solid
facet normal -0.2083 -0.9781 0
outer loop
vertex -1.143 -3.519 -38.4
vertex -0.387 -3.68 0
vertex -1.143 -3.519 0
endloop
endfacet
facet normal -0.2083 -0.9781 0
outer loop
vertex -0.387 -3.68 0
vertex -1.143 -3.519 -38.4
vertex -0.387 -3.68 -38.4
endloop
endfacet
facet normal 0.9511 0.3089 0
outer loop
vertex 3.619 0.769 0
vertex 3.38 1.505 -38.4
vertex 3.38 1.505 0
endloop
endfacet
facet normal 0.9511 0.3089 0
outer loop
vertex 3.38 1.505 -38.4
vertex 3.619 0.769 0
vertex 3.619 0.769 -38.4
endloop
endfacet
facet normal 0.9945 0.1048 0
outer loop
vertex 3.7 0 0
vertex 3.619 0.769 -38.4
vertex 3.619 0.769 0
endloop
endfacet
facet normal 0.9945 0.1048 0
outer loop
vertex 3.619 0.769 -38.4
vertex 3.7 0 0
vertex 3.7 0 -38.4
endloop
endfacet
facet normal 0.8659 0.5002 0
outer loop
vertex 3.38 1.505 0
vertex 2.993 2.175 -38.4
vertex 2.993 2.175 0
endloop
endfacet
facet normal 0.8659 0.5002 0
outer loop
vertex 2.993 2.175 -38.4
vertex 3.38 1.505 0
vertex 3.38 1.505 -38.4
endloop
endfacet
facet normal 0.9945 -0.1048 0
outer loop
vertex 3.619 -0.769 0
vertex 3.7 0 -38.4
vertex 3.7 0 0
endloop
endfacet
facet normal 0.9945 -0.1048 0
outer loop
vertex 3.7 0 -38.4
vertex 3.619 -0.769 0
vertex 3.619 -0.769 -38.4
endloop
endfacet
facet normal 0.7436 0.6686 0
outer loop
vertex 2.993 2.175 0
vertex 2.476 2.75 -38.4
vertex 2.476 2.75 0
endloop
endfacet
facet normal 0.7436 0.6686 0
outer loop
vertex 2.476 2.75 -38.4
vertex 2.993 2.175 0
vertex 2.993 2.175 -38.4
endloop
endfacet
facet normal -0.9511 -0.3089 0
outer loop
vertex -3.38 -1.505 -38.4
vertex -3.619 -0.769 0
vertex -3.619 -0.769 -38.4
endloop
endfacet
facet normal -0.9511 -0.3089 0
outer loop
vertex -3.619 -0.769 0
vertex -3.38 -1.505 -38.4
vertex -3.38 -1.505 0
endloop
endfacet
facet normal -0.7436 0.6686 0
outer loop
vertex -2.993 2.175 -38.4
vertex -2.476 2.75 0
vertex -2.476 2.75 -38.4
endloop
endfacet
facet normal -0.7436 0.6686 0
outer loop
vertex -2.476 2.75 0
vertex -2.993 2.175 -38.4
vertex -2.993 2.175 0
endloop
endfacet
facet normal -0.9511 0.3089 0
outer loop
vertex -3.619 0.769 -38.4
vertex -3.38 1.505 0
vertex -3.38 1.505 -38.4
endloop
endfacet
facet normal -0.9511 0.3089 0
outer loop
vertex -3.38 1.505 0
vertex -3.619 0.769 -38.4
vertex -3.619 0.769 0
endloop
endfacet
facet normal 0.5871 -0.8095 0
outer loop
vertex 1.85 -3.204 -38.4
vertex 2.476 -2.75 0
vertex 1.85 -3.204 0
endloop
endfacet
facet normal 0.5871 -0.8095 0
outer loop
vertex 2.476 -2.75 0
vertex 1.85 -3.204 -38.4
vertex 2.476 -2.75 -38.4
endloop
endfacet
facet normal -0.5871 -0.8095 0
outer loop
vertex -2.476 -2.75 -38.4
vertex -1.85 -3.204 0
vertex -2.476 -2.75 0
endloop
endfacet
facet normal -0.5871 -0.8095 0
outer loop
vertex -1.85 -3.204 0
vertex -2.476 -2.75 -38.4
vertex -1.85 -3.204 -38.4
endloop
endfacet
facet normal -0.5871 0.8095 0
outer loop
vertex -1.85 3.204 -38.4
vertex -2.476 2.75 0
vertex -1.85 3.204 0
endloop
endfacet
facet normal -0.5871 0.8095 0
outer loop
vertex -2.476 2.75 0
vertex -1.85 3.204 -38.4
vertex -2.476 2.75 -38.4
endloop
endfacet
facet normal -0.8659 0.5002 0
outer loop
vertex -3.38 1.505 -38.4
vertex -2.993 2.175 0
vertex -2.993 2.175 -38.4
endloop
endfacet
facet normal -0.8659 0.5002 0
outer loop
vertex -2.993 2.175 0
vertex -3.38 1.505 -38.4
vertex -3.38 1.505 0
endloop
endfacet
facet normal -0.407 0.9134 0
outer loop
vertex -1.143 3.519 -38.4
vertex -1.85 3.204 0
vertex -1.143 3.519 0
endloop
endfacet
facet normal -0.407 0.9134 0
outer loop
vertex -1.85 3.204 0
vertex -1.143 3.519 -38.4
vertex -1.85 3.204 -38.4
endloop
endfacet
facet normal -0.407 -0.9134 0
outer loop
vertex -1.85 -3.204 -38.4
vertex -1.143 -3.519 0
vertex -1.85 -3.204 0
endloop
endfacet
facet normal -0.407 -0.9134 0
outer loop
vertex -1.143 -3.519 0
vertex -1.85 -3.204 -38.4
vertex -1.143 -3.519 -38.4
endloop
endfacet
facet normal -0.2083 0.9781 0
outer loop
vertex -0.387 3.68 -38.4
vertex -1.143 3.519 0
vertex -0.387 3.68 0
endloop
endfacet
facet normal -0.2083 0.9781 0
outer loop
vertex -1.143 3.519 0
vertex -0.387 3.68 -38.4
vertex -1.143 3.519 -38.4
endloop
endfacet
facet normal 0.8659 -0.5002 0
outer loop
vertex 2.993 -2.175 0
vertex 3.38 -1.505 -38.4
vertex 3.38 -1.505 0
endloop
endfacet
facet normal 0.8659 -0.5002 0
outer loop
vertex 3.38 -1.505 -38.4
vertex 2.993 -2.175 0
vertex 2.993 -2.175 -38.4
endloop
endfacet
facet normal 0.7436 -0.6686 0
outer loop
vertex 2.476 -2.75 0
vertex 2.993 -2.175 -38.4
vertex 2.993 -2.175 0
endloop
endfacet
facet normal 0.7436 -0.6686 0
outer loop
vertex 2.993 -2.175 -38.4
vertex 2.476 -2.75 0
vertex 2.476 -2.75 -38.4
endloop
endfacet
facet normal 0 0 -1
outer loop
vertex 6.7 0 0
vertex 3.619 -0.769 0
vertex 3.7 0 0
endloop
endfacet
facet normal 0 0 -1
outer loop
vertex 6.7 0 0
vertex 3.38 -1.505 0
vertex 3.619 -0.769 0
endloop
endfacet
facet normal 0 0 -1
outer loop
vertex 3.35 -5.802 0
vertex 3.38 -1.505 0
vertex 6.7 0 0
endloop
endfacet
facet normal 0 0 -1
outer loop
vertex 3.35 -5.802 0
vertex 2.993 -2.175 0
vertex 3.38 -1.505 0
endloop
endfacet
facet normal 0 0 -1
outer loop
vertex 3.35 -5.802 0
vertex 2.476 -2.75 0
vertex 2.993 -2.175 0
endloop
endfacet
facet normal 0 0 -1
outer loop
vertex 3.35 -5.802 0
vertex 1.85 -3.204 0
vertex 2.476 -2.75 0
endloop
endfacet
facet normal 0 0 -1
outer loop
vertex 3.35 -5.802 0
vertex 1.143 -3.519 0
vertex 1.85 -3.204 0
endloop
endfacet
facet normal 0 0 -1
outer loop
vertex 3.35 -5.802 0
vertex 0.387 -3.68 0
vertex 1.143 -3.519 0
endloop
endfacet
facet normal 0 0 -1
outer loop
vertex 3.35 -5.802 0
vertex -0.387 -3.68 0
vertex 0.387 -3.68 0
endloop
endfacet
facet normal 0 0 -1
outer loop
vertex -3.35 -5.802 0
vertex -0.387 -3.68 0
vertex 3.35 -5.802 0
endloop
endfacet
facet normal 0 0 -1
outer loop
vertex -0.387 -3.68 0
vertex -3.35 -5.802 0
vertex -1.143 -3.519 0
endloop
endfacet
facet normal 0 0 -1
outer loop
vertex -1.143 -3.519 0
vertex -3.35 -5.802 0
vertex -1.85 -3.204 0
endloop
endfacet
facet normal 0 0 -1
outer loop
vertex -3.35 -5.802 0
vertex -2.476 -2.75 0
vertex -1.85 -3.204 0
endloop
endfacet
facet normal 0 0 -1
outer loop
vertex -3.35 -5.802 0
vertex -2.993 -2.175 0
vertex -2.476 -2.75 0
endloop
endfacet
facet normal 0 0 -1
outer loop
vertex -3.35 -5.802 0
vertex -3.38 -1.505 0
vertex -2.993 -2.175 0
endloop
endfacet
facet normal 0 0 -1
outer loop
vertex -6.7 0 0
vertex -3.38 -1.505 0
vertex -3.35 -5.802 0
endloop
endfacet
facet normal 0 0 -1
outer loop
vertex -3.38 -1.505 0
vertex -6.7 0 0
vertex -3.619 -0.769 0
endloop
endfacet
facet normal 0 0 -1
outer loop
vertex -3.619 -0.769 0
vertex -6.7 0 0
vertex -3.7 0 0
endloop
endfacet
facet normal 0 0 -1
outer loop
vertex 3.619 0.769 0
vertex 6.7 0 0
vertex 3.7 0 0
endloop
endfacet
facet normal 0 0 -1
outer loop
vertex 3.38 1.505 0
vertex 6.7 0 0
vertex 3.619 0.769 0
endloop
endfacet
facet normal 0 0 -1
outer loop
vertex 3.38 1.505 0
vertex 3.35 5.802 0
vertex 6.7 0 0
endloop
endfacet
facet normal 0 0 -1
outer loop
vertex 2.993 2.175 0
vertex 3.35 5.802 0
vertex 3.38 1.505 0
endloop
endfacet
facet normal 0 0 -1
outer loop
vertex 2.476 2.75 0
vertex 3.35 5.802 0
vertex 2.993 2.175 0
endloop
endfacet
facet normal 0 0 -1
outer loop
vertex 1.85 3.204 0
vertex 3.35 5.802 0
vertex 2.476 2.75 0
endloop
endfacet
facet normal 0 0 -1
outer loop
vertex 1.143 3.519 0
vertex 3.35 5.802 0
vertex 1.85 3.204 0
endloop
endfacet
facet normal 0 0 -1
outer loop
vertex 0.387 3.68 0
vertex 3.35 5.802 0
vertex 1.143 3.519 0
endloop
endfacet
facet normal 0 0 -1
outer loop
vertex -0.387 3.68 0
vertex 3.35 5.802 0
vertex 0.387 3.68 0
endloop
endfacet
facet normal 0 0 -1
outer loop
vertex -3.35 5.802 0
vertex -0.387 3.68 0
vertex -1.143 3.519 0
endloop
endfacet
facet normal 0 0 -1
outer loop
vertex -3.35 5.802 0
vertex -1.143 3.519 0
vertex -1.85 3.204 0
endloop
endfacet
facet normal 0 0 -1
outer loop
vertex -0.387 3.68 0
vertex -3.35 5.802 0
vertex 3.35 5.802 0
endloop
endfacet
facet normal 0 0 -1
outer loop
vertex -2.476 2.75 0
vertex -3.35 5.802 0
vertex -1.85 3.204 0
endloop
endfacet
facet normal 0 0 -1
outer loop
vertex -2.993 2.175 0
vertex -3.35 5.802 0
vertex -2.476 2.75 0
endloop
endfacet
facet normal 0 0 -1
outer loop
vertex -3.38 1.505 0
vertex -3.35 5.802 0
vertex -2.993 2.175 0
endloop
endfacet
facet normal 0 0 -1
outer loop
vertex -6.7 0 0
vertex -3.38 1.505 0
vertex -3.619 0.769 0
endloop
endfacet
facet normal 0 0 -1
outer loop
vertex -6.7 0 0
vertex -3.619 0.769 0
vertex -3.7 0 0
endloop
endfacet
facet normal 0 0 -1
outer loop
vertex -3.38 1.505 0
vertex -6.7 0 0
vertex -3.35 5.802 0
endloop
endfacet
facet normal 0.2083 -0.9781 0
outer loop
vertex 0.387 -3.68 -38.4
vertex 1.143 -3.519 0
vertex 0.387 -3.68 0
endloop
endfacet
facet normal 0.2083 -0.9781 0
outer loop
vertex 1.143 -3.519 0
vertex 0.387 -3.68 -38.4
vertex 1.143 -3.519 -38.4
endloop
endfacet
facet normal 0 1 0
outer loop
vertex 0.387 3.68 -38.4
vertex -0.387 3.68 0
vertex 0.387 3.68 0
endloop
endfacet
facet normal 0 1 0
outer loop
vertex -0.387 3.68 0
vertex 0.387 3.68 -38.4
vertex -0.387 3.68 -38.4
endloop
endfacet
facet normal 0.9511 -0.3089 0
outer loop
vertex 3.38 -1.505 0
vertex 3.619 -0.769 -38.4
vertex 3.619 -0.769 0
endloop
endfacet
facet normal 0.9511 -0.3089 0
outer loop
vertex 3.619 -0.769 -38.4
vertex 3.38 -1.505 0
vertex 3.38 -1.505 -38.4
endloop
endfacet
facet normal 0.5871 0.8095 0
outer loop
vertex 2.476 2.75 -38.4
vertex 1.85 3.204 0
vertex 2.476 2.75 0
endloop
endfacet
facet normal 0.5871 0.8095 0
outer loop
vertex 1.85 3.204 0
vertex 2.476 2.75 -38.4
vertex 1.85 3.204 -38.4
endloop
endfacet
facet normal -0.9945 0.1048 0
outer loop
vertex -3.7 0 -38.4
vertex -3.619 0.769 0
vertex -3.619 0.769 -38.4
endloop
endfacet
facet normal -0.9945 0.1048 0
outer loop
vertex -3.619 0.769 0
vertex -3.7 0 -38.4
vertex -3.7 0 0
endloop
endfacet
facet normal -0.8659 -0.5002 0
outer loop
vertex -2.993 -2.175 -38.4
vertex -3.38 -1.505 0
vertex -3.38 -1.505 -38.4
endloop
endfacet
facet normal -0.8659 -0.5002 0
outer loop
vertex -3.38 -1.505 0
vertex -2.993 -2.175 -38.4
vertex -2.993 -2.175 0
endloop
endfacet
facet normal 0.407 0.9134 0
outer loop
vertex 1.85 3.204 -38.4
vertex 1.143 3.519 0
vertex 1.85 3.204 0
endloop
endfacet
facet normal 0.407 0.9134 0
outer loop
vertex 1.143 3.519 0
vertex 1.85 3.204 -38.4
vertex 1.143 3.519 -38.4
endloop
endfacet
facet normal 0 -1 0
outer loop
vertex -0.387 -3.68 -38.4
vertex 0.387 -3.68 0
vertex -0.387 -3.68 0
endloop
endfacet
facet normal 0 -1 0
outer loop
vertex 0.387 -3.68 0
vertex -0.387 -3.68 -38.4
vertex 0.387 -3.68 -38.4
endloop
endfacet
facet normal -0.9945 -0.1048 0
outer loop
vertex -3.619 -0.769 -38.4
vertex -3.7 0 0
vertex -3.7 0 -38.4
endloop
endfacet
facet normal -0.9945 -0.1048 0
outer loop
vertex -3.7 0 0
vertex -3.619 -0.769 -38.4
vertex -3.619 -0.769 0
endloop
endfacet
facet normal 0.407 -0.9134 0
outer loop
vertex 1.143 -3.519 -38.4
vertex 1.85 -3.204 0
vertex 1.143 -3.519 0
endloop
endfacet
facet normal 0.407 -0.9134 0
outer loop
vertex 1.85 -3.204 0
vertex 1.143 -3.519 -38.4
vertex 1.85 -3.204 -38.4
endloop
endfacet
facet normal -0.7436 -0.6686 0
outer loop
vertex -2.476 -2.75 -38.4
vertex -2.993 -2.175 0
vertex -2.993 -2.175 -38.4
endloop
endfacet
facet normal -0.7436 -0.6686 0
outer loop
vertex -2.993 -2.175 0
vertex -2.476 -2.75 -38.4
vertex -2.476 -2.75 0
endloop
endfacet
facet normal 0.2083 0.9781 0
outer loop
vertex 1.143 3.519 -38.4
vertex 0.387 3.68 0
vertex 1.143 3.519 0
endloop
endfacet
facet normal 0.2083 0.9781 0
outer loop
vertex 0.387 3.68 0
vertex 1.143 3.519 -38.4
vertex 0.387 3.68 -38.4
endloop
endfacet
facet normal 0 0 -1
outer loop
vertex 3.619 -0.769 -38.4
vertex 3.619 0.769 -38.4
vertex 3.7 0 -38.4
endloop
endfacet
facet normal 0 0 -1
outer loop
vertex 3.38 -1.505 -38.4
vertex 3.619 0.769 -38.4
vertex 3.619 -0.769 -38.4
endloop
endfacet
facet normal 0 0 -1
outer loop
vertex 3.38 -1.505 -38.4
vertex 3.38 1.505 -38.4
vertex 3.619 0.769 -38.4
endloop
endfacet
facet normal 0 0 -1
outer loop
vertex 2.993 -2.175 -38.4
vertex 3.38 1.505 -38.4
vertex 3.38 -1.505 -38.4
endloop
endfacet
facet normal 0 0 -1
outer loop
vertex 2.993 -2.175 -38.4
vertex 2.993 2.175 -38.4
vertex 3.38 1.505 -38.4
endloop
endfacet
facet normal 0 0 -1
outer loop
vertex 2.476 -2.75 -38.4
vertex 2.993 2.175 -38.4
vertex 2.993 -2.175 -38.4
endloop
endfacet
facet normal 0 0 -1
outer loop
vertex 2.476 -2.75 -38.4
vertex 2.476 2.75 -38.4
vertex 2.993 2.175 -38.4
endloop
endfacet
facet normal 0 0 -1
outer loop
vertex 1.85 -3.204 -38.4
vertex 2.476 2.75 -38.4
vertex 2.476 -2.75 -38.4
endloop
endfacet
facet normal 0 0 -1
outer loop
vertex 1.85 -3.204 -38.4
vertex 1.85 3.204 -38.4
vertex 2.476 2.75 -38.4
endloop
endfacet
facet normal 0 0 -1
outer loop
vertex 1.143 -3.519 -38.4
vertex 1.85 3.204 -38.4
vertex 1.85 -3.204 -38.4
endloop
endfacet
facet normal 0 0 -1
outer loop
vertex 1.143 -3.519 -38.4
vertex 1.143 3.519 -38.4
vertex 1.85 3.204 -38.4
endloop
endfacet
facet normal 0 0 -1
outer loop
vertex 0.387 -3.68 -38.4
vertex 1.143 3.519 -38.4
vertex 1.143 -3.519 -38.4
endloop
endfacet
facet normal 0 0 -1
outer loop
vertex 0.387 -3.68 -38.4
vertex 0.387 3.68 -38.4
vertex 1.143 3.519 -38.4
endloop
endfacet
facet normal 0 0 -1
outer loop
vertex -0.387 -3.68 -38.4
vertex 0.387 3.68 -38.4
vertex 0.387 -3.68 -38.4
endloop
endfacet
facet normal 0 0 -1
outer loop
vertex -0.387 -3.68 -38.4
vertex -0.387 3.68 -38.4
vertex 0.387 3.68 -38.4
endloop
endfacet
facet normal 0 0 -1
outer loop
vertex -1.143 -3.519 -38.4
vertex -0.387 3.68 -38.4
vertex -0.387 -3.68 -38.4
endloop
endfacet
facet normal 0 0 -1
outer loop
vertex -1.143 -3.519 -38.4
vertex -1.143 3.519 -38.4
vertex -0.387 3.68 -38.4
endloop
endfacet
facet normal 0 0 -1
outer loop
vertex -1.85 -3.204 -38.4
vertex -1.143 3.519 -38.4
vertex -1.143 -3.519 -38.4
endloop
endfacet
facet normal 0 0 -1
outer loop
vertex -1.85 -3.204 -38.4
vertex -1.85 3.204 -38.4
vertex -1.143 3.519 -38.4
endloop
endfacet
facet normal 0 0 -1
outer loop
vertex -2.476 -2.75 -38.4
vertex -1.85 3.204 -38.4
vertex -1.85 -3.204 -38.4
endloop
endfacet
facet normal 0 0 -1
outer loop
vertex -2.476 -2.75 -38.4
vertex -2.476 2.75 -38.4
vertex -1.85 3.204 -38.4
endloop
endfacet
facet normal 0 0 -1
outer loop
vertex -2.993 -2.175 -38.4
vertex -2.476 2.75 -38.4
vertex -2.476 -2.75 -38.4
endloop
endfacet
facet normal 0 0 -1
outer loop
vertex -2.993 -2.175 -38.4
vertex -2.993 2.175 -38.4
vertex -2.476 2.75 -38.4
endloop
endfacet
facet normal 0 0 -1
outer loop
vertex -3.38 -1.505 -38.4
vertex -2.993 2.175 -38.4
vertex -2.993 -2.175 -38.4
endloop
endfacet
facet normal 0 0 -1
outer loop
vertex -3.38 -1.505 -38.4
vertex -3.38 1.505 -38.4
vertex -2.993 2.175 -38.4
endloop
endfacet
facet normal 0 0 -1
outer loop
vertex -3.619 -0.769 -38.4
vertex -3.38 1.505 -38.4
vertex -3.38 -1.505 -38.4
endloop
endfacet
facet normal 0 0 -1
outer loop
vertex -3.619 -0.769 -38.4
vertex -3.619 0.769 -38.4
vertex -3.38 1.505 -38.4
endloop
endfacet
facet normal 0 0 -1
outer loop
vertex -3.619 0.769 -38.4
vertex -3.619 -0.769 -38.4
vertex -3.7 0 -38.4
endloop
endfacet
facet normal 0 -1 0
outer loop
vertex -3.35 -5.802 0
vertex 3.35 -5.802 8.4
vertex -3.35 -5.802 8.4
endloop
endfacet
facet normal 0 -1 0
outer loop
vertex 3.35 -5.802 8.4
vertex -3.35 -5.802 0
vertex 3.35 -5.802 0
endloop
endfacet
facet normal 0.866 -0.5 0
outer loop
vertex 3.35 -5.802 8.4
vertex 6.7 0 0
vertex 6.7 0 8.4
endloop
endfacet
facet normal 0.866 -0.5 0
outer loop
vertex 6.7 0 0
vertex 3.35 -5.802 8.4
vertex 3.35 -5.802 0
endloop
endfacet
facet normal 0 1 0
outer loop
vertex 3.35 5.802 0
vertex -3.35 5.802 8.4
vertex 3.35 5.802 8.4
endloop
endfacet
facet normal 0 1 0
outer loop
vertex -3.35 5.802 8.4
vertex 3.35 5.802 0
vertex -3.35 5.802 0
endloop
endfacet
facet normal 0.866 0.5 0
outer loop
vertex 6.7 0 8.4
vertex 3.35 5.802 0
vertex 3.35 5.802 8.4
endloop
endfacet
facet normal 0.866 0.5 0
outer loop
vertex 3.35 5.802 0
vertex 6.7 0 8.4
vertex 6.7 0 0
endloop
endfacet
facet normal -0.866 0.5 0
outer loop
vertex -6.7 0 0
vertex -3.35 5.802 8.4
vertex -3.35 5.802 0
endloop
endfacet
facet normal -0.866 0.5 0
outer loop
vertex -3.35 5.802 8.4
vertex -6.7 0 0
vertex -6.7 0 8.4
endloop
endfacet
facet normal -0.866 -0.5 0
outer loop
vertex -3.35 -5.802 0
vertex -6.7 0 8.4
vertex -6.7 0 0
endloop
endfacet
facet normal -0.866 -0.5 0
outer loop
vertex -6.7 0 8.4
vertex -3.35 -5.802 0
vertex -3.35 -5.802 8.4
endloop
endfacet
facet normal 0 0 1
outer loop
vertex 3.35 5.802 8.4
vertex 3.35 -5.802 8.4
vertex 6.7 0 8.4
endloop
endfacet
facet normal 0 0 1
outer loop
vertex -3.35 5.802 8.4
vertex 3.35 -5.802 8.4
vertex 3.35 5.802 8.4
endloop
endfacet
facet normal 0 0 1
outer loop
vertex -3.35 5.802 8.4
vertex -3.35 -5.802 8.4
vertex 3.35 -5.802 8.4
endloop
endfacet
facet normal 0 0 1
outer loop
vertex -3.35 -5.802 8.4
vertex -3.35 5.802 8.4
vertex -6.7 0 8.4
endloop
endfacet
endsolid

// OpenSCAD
function M8x30BoltDiameter(3dPrinterTolerance=.4)= 7+3dPrinterTolerance;
function M8x30BoltLength(3dPrinterTolerance=.4)= 38+3dPrinterTolerance;
function M8x30BoltHeadDiameter(3dPrinterTolerance=.4)= 13+3dPrinterTolerance;
function M8x30BoltHeadHeight(3dPrinterTolerance=.4)= 8+3dPrinterTolerance;

//err on the side of larger tolerances for bolts

module M8x30Bolt(3dPrinterTolerance=.4)
{
	union()
	{
		translate([0,0,-M8x30BoltLength(3dPrinterTolerance)])
		{
			cylinder(h=M8x30BoltLength(3dPrinterTolerance),r=M8x30BoltDiameter(3dPrinterTolerance)/2,$fn=30);
		}
		cylinder(h=M8x30BoltHeadHeight(3dPrinterTolerance),r=M8x30BoltHeadDiameter(3dPrinterTolerance)/2,$fn=6);
	}
}

M8x30Bolt();
